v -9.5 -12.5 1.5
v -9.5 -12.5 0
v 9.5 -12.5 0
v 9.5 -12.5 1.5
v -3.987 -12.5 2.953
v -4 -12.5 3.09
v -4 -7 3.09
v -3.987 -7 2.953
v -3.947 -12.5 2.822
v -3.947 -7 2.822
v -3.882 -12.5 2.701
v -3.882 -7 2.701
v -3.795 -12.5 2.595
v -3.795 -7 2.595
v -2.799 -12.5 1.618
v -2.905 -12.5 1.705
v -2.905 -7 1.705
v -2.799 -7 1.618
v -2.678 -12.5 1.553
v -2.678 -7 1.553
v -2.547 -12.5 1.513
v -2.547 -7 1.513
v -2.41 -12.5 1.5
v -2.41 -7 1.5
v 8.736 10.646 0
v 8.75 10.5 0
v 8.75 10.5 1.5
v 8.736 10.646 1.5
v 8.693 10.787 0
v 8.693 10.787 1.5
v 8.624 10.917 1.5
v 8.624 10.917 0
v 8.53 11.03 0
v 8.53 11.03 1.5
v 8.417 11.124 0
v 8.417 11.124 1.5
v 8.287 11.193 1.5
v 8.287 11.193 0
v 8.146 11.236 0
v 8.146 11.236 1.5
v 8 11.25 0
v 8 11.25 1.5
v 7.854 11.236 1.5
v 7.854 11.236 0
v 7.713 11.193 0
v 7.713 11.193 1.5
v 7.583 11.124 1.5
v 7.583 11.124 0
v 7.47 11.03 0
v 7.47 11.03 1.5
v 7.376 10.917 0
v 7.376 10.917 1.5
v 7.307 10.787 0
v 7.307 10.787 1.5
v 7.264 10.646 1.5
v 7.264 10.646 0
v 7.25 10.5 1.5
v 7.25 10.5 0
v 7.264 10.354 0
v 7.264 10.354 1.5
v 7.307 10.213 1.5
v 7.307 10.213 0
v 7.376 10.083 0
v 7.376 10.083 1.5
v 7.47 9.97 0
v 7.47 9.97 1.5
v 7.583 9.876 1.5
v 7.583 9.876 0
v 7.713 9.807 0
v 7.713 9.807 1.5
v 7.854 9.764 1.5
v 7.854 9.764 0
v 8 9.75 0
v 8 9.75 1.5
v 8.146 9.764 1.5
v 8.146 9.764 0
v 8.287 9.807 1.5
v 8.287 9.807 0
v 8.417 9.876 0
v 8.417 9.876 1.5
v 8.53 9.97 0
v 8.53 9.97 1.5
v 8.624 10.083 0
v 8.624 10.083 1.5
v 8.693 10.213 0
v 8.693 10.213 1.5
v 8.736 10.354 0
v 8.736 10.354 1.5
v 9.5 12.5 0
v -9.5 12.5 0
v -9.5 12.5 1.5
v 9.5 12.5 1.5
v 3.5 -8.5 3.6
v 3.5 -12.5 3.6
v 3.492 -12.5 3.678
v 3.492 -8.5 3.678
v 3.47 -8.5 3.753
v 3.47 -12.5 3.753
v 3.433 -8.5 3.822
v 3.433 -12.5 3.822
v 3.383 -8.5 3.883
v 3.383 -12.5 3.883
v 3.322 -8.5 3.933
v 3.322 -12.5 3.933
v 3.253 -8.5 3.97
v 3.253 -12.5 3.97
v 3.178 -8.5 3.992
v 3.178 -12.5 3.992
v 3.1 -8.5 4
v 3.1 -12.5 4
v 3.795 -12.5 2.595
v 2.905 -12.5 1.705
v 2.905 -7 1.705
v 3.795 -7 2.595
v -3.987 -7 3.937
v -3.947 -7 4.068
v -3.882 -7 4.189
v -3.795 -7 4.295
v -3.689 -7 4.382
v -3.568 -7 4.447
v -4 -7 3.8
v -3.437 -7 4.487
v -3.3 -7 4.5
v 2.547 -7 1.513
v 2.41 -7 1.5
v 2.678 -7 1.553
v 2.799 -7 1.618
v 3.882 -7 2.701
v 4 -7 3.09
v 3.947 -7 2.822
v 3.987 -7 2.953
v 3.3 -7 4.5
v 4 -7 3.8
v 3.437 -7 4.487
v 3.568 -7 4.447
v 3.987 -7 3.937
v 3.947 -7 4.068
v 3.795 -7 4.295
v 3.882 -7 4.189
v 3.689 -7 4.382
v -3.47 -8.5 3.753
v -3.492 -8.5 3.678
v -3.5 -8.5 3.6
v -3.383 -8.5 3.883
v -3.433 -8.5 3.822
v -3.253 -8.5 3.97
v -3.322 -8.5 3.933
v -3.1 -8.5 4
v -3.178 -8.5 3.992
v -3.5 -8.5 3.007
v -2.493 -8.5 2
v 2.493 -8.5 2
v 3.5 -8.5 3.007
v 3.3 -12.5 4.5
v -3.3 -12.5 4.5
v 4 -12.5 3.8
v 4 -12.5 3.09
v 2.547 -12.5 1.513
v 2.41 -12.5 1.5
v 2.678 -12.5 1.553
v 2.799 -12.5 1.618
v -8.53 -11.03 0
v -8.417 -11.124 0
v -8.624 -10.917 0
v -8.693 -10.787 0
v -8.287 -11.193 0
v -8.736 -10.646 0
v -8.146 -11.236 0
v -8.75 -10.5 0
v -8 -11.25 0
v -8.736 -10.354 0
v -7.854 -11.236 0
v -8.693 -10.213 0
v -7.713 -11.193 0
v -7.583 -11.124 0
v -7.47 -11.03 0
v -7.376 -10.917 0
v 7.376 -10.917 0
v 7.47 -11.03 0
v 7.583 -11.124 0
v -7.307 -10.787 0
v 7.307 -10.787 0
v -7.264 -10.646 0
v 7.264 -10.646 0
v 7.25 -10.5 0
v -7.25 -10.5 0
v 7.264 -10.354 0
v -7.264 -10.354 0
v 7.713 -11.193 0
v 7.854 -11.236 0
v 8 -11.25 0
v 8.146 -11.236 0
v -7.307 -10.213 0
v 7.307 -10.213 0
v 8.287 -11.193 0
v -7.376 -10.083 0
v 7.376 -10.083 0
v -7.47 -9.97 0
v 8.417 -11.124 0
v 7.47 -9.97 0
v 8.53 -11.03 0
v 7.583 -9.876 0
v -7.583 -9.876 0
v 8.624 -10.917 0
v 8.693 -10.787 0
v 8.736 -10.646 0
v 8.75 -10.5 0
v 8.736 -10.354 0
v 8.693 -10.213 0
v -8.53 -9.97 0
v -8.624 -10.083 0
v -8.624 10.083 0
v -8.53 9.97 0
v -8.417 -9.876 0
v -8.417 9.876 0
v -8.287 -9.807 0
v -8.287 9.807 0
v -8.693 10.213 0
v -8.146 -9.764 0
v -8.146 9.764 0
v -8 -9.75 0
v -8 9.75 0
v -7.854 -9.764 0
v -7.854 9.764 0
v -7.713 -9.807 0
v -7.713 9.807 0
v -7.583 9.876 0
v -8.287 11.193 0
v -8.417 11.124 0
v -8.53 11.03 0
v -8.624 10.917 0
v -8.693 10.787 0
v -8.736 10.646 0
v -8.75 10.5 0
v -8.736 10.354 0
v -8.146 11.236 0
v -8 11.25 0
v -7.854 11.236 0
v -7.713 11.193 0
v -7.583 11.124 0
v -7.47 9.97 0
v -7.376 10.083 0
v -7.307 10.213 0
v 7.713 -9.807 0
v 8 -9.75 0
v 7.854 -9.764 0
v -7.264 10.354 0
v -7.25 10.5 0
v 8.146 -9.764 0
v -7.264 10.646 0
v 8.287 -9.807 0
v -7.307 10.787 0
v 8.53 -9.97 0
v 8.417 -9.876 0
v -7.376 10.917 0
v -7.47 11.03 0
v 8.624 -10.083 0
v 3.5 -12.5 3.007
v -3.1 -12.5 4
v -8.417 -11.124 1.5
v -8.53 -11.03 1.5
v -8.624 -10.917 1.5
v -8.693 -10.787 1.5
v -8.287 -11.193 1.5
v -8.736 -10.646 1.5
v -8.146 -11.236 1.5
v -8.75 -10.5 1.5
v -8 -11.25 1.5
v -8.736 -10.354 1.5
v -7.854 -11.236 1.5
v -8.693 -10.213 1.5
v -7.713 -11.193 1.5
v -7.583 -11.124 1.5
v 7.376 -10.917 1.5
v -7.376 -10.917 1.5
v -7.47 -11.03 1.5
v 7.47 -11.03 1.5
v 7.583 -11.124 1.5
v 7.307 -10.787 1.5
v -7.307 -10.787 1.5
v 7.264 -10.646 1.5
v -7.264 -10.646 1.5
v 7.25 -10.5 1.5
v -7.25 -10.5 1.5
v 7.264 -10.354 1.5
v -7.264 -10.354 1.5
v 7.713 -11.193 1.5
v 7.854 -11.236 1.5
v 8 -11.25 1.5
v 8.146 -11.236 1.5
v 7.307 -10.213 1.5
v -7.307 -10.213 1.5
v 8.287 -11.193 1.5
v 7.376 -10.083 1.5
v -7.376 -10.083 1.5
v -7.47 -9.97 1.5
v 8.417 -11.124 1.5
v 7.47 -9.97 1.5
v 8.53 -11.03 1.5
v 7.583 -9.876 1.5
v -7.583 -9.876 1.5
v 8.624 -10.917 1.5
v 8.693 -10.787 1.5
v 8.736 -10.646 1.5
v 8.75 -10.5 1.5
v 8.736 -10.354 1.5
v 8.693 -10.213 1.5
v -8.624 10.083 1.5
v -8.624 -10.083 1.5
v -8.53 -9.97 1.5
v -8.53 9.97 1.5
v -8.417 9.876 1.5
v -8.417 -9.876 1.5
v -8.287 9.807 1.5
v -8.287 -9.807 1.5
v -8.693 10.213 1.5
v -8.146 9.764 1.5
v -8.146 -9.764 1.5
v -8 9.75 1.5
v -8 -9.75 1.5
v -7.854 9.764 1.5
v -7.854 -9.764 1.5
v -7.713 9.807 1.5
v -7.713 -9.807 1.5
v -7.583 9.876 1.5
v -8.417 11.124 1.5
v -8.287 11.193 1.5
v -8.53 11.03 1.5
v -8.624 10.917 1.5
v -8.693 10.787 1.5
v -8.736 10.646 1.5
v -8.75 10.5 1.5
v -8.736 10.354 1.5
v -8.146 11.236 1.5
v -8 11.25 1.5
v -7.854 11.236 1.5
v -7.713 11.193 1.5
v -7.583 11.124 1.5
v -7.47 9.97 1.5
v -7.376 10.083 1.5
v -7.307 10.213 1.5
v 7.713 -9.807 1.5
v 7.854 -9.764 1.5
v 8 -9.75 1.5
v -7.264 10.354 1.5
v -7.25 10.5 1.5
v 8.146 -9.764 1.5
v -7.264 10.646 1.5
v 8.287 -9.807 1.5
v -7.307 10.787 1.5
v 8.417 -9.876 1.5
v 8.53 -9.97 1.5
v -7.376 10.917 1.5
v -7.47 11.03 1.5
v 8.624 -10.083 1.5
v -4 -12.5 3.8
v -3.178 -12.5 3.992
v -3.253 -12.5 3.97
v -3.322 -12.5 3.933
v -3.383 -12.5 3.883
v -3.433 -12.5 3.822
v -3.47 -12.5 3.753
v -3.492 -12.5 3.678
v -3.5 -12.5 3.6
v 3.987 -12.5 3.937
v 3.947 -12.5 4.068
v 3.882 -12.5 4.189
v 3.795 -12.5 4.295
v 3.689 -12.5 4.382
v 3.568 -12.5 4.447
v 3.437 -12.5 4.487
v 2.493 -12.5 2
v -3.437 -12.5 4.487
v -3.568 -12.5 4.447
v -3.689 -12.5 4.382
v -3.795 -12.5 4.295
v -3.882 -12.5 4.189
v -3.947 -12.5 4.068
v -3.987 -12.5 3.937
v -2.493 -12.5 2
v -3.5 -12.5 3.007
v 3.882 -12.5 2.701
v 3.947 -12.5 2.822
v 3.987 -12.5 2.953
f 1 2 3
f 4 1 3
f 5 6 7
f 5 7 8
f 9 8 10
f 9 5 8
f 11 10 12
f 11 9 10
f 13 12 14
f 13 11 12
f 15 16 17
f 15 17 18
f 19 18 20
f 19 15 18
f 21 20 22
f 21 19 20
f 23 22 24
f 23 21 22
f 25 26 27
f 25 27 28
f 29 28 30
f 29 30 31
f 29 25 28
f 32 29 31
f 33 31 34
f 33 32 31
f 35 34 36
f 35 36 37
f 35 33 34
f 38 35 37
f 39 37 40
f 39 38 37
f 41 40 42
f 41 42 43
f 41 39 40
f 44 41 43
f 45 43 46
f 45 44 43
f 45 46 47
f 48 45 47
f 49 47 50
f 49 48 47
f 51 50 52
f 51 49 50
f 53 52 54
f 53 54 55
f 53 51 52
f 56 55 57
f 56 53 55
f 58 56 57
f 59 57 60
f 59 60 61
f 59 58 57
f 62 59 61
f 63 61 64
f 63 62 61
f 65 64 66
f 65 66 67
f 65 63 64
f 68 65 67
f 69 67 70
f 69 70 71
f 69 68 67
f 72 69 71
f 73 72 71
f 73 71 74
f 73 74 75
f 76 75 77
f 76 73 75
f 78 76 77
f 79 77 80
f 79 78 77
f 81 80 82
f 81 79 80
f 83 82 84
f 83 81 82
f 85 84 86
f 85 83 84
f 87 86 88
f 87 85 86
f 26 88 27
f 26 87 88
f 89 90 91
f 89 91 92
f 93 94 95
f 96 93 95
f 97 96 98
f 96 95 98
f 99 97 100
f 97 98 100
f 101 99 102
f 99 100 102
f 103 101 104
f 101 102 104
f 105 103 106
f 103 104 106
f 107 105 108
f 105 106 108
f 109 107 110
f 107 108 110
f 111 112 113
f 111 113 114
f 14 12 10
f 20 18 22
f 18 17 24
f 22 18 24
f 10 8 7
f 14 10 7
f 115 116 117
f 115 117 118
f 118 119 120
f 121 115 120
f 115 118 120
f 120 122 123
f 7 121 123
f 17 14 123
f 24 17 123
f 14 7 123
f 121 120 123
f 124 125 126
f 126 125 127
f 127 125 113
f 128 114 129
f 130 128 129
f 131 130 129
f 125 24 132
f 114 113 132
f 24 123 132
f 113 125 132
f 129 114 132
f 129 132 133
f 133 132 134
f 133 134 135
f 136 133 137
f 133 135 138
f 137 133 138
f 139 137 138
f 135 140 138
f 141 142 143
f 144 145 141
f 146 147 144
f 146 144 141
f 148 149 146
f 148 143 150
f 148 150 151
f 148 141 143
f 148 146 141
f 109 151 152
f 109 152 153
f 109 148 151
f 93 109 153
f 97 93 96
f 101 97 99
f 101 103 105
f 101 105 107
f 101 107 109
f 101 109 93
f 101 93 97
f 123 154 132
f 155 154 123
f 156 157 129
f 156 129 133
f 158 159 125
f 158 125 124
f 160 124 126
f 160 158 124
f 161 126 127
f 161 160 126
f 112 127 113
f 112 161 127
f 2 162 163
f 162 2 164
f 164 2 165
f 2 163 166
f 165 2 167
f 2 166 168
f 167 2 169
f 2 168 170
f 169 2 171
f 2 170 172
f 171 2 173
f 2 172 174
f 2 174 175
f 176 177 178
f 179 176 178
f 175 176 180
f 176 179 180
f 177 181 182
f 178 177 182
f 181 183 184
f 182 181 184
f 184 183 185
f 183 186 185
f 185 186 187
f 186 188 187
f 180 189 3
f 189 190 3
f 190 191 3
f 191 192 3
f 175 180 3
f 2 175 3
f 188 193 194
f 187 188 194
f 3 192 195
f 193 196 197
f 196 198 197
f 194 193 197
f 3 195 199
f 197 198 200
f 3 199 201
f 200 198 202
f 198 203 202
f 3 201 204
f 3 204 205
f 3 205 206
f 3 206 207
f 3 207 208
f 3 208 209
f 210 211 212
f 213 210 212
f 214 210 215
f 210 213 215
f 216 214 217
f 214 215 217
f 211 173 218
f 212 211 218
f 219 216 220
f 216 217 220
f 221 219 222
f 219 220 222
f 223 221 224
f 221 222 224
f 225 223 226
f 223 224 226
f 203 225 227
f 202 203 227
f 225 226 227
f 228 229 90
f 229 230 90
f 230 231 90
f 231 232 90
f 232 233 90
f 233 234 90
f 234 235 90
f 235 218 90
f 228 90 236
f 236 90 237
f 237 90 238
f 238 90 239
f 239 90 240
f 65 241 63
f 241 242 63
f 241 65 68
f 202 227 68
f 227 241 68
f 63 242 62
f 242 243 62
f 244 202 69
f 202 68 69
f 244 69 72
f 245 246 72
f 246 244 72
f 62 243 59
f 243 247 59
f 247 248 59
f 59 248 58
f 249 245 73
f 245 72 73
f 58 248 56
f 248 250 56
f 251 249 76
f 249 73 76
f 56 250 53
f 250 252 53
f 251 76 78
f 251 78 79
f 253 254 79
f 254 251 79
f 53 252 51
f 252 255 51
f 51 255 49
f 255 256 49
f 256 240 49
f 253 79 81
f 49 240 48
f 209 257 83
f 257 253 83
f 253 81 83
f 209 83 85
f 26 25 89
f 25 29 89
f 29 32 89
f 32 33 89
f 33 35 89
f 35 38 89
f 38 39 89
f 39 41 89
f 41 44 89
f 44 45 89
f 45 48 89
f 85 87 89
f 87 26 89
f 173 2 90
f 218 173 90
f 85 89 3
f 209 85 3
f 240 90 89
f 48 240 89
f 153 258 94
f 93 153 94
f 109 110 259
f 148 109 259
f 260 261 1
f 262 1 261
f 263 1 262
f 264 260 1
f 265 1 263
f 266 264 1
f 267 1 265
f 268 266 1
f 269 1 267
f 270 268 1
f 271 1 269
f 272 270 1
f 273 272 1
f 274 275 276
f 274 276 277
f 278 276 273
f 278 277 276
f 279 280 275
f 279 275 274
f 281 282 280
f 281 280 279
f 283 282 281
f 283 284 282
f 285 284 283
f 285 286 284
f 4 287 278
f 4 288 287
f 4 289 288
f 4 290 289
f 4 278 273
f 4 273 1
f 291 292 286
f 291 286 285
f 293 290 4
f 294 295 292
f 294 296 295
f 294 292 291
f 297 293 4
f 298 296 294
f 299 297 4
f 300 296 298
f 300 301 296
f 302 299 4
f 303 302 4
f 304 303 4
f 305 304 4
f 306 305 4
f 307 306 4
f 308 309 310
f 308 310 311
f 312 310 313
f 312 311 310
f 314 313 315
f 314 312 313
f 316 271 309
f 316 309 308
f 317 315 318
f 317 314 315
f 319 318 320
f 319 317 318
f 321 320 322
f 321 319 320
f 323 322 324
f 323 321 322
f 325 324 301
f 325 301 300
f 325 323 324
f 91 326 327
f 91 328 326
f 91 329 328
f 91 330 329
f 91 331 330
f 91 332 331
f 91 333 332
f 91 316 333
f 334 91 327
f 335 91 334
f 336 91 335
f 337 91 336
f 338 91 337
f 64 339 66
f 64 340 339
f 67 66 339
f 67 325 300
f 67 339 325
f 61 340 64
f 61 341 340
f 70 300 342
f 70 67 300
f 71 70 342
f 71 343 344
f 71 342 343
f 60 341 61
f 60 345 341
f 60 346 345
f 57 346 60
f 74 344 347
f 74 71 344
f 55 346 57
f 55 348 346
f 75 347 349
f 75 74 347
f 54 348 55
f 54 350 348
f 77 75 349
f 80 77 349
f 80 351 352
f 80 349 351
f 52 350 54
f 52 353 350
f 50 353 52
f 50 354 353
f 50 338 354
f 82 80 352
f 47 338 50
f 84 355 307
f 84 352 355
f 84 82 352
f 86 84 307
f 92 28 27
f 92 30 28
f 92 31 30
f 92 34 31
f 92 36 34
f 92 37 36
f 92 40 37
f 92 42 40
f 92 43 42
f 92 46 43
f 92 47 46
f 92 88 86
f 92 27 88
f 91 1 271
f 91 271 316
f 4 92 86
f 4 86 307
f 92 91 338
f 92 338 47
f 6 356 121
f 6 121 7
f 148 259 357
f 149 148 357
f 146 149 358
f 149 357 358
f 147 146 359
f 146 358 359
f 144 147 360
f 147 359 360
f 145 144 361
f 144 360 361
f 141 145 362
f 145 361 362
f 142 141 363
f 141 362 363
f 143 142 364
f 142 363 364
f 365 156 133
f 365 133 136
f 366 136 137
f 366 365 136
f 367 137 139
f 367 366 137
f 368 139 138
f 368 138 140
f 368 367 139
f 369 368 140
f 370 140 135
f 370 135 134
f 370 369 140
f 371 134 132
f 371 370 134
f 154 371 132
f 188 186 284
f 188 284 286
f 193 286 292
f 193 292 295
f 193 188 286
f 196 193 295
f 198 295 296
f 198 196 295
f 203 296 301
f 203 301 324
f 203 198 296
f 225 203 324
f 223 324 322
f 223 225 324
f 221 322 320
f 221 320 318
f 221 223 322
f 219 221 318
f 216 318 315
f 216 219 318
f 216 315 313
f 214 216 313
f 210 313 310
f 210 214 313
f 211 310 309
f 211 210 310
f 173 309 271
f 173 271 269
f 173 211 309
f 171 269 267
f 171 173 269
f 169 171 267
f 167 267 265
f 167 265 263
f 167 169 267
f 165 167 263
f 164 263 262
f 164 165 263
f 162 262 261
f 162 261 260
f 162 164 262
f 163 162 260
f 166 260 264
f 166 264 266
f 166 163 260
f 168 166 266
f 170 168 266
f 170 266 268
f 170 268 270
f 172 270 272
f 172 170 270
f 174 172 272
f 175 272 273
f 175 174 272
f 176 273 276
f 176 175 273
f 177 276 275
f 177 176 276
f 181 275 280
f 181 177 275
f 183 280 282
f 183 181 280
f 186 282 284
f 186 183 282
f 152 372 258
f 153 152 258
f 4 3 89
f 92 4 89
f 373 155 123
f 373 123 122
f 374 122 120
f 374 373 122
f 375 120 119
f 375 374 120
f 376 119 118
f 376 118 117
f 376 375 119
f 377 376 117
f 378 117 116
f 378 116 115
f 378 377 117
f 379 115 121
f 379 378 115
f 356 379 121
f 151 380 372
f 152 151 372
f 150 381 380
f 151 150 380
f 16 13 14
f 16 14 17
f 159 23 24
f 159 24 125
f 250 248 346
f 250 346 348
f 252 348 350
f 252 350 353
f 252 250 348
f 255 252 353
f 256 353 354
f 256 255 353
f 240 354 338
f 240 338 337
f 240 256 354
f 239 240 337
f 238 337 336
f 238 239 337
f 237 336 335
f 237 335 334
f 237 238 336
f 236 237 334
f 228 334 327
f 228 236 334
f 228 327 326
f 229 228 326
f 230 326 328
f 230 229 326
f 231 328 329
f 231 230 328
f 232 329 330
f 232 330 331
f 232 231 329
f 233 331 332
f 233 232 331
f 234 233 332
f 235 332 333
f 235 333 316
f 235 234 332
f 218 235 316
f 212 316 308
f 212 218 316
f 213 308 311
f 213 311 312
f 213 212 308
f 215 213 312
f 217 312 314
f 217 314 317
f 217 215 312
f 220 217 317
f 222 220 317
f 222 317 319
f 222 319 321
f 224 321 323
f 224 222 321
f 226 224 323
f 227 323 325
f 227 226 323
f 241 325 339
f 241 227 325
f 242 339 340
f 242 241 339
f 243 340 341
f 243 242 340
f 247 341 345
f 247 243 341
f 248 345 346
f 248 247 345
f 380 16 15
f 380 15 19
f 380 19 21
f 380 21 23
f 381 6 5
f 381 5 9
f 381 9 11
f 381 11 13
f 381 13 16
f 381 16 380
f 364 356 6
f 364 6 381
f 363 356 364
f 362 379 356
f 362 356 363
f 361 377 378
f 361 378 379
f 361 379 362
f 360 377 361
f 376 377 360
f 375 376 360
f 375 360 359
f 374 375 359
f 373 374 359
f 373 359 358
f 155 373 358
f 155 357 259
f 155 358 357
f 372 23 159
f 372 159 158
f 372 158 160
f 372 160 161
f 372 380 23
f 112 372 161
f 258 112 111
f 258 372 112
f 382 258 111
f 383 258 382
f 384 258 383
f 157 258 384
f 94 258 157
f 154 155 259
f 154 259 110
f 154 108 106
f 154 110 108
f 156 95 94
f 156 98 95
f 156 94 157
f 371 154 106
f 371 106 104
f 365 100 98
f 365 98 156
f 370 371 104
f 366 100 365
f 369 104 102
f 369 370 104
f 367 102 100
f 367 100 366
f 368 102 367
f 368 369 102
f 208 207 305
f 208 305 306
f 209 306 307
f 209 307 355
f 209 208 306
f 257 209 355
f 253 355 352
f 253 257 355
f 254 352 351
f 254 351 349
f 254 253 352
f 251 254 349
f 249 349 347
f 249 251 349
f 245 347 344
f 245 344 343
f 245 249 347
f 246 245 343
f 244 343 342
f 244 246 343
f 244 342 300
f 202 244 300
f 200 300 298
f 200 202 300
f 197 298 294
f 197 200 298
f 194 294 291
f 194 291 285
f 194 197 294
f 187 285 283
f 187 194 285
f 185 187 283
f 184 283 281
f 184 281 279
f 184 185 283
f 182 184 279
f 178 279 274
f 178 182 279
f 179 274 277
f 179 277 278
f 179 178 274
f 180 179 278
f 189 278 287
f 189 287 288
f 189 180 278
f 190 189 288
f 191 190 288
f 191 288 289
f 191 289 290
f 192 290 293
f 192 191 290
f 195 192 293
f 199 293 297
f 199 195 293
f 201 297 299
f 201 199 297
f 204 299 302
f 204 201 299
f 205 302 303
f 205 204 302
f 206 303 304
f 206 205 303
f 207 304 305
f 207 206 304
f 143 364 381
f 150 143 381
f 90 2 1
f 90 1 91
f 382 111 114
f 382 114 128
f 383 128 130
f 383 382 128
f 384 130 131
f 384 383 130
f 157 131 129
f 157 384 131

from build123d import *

# Parameters (mm, degrees)
F0_W     = 19
F0_H     = 25
F0_R     = 0.75
F1_DEPTH = 1.5
F3_DEPTH = 5.5
F4_DEPTH = 4


with BuildPart() as f1:
    # F0 (on Top) → F1 (new body)
    with BuildSketch(Plane.XY):
        Rectangle(F0_W, F0_H)
        with Locations((-8, -10.5)):
            Circle(F0_R, mode=Mode.SUBTRACT)
        with Locations((8, -10.5)):
            Circle(F0_R, mode=Mode.SUBTRACT)
        with Locations((-8, 10.5)):
            Circle(F0_R, mode=Mode.SUBTRACT)
        with Locations((8, 10.5)):
            Circle(F0_R, mode=Mode.SUBTRACT)
    extrude(amount=F1_DEPTH)


with BuildPart() as f3:
    # F2 (on face) → F3 (new body)
    with BuildSketch(Plane.XZ.offset(12.5)):
        with BuildLine():
            Line((-2.410051, 1.5), (0, 1.5))
            Line((0, 1.5), (2.410051, 1.5))
            ThreePointArc((2.410051, 1.5), (2.677929, 1.553284), (2.905025, 1.705025))
            Line((2.905025, 1.705025), (3.794975, 2.594975))
            ThreePointArc((3.794975, 2.594975), (3.946716, 2.822071), (4, 3.089949))
            Line((4, 3.089949), (4, 3.8))
            ThreePointArc((4, 3.8), (3.794975, 4.294975), (3.3, 4.5))
            Line((3.3, 4.5), (0, 4.5))
            Line((0, 4.5), (-3.3, 4.5))
            ThreePointArc((-3.3, 4.5), (-3.794975, 4.294975), (-4, 3.8))
            Line((-4, 3.8), (-4, 3.089949))
            ThreePointArc((-4, 3.089949), (-3.946716, 2.822071), (-3.794975, 2.594975))
            Line((-3.794975, 2.594975), (-2.905025, 1.705025))
            ThreePointArc((-2.905025, 1.705025), (-2.677929, 1.553284), (-2.410051, 1.5))
        make_face()
        with BuildLine():
            Line((-3.1, 4), (0, 4))
            Line((0, 4), (3.1, 4))
            ThreePointArc((3.1, 4), (3.382843, 3.882843), (3.5, 3.6))
            Line((3.5, 3.6), (3.5, 3.007107))
            Line((3.5, 3.007107), (2.492893, 2))
            Line((2.492893, 2), (0, 2))
            Line((0, 2), (-2.492893, 2))
            Line((-2.492893, 2), (-3.5, 3.007107))
            Line((-3.5, 3.007107), (-3.5, 3.6))
            ThreePointArc((-3.5, 3.6), (-3.382843, 3.882843), (-3.1, 4))
        make_face(mode=Mode.SUBTRACT)
        with BuildLine():
            Line((3.1, 4), (0, 4))
            Line((0, 4), (-3.1, 4))
            ThreePointArc((-3.1, 4), (-3.382843, 3.882843), (-3.5, 3.6))
            Line((-3.5, 3.6), (-3.5, 3.007107))
            Line((-3.5, 3.007107), (-2.492893, 2))
            Line((-2.492893, 2), (0, 2))
            Line((0, 2), (2.492893, 2))
            Line((2.492893, 2), (3.5, 3.007107))
            Line((3.5, 3.007107), (3.5, 3.6))
            ThreePointArc((3.5, 3.6), (3.382843, 3.882843), (3.1, 4))
        make_face()
    extrude(amount=-F3_DEPTH)

    # F2 (on face) → F4 (cut)
    with BuildSketch(Plane.XZ.offset(12.5)):
        with BuildLine():
            Line((3.1, 4), (0, 4))
            Line((0, 4), (-3.1, 4))
            ThreePointArc((-3.1, 4), (-3.382843, 3.882843), (-3.5, 3.6))
            Line((-3.5, 3.6), (-3.5, 3.007107))
            Line((-3.5, 3.007107), (-2.492893, 2))
            Line((-2.492893, 2), (0, 2))
            Line((0, 2), (2.492893, 2))
            Line((2.492893, 2), (3.5, 3.007107))
            Line((3.5, 3.007107), (3.5, 3.6))
            ThreePointArc((3.5, 3.6), (3.382843, 3.882843), (3.1, 4))
        make_face()
    extrude(amount=-F4_DEPTH, mode=Mode.SUBTRACT)


solid = Compound([f1.part, f3.part])
